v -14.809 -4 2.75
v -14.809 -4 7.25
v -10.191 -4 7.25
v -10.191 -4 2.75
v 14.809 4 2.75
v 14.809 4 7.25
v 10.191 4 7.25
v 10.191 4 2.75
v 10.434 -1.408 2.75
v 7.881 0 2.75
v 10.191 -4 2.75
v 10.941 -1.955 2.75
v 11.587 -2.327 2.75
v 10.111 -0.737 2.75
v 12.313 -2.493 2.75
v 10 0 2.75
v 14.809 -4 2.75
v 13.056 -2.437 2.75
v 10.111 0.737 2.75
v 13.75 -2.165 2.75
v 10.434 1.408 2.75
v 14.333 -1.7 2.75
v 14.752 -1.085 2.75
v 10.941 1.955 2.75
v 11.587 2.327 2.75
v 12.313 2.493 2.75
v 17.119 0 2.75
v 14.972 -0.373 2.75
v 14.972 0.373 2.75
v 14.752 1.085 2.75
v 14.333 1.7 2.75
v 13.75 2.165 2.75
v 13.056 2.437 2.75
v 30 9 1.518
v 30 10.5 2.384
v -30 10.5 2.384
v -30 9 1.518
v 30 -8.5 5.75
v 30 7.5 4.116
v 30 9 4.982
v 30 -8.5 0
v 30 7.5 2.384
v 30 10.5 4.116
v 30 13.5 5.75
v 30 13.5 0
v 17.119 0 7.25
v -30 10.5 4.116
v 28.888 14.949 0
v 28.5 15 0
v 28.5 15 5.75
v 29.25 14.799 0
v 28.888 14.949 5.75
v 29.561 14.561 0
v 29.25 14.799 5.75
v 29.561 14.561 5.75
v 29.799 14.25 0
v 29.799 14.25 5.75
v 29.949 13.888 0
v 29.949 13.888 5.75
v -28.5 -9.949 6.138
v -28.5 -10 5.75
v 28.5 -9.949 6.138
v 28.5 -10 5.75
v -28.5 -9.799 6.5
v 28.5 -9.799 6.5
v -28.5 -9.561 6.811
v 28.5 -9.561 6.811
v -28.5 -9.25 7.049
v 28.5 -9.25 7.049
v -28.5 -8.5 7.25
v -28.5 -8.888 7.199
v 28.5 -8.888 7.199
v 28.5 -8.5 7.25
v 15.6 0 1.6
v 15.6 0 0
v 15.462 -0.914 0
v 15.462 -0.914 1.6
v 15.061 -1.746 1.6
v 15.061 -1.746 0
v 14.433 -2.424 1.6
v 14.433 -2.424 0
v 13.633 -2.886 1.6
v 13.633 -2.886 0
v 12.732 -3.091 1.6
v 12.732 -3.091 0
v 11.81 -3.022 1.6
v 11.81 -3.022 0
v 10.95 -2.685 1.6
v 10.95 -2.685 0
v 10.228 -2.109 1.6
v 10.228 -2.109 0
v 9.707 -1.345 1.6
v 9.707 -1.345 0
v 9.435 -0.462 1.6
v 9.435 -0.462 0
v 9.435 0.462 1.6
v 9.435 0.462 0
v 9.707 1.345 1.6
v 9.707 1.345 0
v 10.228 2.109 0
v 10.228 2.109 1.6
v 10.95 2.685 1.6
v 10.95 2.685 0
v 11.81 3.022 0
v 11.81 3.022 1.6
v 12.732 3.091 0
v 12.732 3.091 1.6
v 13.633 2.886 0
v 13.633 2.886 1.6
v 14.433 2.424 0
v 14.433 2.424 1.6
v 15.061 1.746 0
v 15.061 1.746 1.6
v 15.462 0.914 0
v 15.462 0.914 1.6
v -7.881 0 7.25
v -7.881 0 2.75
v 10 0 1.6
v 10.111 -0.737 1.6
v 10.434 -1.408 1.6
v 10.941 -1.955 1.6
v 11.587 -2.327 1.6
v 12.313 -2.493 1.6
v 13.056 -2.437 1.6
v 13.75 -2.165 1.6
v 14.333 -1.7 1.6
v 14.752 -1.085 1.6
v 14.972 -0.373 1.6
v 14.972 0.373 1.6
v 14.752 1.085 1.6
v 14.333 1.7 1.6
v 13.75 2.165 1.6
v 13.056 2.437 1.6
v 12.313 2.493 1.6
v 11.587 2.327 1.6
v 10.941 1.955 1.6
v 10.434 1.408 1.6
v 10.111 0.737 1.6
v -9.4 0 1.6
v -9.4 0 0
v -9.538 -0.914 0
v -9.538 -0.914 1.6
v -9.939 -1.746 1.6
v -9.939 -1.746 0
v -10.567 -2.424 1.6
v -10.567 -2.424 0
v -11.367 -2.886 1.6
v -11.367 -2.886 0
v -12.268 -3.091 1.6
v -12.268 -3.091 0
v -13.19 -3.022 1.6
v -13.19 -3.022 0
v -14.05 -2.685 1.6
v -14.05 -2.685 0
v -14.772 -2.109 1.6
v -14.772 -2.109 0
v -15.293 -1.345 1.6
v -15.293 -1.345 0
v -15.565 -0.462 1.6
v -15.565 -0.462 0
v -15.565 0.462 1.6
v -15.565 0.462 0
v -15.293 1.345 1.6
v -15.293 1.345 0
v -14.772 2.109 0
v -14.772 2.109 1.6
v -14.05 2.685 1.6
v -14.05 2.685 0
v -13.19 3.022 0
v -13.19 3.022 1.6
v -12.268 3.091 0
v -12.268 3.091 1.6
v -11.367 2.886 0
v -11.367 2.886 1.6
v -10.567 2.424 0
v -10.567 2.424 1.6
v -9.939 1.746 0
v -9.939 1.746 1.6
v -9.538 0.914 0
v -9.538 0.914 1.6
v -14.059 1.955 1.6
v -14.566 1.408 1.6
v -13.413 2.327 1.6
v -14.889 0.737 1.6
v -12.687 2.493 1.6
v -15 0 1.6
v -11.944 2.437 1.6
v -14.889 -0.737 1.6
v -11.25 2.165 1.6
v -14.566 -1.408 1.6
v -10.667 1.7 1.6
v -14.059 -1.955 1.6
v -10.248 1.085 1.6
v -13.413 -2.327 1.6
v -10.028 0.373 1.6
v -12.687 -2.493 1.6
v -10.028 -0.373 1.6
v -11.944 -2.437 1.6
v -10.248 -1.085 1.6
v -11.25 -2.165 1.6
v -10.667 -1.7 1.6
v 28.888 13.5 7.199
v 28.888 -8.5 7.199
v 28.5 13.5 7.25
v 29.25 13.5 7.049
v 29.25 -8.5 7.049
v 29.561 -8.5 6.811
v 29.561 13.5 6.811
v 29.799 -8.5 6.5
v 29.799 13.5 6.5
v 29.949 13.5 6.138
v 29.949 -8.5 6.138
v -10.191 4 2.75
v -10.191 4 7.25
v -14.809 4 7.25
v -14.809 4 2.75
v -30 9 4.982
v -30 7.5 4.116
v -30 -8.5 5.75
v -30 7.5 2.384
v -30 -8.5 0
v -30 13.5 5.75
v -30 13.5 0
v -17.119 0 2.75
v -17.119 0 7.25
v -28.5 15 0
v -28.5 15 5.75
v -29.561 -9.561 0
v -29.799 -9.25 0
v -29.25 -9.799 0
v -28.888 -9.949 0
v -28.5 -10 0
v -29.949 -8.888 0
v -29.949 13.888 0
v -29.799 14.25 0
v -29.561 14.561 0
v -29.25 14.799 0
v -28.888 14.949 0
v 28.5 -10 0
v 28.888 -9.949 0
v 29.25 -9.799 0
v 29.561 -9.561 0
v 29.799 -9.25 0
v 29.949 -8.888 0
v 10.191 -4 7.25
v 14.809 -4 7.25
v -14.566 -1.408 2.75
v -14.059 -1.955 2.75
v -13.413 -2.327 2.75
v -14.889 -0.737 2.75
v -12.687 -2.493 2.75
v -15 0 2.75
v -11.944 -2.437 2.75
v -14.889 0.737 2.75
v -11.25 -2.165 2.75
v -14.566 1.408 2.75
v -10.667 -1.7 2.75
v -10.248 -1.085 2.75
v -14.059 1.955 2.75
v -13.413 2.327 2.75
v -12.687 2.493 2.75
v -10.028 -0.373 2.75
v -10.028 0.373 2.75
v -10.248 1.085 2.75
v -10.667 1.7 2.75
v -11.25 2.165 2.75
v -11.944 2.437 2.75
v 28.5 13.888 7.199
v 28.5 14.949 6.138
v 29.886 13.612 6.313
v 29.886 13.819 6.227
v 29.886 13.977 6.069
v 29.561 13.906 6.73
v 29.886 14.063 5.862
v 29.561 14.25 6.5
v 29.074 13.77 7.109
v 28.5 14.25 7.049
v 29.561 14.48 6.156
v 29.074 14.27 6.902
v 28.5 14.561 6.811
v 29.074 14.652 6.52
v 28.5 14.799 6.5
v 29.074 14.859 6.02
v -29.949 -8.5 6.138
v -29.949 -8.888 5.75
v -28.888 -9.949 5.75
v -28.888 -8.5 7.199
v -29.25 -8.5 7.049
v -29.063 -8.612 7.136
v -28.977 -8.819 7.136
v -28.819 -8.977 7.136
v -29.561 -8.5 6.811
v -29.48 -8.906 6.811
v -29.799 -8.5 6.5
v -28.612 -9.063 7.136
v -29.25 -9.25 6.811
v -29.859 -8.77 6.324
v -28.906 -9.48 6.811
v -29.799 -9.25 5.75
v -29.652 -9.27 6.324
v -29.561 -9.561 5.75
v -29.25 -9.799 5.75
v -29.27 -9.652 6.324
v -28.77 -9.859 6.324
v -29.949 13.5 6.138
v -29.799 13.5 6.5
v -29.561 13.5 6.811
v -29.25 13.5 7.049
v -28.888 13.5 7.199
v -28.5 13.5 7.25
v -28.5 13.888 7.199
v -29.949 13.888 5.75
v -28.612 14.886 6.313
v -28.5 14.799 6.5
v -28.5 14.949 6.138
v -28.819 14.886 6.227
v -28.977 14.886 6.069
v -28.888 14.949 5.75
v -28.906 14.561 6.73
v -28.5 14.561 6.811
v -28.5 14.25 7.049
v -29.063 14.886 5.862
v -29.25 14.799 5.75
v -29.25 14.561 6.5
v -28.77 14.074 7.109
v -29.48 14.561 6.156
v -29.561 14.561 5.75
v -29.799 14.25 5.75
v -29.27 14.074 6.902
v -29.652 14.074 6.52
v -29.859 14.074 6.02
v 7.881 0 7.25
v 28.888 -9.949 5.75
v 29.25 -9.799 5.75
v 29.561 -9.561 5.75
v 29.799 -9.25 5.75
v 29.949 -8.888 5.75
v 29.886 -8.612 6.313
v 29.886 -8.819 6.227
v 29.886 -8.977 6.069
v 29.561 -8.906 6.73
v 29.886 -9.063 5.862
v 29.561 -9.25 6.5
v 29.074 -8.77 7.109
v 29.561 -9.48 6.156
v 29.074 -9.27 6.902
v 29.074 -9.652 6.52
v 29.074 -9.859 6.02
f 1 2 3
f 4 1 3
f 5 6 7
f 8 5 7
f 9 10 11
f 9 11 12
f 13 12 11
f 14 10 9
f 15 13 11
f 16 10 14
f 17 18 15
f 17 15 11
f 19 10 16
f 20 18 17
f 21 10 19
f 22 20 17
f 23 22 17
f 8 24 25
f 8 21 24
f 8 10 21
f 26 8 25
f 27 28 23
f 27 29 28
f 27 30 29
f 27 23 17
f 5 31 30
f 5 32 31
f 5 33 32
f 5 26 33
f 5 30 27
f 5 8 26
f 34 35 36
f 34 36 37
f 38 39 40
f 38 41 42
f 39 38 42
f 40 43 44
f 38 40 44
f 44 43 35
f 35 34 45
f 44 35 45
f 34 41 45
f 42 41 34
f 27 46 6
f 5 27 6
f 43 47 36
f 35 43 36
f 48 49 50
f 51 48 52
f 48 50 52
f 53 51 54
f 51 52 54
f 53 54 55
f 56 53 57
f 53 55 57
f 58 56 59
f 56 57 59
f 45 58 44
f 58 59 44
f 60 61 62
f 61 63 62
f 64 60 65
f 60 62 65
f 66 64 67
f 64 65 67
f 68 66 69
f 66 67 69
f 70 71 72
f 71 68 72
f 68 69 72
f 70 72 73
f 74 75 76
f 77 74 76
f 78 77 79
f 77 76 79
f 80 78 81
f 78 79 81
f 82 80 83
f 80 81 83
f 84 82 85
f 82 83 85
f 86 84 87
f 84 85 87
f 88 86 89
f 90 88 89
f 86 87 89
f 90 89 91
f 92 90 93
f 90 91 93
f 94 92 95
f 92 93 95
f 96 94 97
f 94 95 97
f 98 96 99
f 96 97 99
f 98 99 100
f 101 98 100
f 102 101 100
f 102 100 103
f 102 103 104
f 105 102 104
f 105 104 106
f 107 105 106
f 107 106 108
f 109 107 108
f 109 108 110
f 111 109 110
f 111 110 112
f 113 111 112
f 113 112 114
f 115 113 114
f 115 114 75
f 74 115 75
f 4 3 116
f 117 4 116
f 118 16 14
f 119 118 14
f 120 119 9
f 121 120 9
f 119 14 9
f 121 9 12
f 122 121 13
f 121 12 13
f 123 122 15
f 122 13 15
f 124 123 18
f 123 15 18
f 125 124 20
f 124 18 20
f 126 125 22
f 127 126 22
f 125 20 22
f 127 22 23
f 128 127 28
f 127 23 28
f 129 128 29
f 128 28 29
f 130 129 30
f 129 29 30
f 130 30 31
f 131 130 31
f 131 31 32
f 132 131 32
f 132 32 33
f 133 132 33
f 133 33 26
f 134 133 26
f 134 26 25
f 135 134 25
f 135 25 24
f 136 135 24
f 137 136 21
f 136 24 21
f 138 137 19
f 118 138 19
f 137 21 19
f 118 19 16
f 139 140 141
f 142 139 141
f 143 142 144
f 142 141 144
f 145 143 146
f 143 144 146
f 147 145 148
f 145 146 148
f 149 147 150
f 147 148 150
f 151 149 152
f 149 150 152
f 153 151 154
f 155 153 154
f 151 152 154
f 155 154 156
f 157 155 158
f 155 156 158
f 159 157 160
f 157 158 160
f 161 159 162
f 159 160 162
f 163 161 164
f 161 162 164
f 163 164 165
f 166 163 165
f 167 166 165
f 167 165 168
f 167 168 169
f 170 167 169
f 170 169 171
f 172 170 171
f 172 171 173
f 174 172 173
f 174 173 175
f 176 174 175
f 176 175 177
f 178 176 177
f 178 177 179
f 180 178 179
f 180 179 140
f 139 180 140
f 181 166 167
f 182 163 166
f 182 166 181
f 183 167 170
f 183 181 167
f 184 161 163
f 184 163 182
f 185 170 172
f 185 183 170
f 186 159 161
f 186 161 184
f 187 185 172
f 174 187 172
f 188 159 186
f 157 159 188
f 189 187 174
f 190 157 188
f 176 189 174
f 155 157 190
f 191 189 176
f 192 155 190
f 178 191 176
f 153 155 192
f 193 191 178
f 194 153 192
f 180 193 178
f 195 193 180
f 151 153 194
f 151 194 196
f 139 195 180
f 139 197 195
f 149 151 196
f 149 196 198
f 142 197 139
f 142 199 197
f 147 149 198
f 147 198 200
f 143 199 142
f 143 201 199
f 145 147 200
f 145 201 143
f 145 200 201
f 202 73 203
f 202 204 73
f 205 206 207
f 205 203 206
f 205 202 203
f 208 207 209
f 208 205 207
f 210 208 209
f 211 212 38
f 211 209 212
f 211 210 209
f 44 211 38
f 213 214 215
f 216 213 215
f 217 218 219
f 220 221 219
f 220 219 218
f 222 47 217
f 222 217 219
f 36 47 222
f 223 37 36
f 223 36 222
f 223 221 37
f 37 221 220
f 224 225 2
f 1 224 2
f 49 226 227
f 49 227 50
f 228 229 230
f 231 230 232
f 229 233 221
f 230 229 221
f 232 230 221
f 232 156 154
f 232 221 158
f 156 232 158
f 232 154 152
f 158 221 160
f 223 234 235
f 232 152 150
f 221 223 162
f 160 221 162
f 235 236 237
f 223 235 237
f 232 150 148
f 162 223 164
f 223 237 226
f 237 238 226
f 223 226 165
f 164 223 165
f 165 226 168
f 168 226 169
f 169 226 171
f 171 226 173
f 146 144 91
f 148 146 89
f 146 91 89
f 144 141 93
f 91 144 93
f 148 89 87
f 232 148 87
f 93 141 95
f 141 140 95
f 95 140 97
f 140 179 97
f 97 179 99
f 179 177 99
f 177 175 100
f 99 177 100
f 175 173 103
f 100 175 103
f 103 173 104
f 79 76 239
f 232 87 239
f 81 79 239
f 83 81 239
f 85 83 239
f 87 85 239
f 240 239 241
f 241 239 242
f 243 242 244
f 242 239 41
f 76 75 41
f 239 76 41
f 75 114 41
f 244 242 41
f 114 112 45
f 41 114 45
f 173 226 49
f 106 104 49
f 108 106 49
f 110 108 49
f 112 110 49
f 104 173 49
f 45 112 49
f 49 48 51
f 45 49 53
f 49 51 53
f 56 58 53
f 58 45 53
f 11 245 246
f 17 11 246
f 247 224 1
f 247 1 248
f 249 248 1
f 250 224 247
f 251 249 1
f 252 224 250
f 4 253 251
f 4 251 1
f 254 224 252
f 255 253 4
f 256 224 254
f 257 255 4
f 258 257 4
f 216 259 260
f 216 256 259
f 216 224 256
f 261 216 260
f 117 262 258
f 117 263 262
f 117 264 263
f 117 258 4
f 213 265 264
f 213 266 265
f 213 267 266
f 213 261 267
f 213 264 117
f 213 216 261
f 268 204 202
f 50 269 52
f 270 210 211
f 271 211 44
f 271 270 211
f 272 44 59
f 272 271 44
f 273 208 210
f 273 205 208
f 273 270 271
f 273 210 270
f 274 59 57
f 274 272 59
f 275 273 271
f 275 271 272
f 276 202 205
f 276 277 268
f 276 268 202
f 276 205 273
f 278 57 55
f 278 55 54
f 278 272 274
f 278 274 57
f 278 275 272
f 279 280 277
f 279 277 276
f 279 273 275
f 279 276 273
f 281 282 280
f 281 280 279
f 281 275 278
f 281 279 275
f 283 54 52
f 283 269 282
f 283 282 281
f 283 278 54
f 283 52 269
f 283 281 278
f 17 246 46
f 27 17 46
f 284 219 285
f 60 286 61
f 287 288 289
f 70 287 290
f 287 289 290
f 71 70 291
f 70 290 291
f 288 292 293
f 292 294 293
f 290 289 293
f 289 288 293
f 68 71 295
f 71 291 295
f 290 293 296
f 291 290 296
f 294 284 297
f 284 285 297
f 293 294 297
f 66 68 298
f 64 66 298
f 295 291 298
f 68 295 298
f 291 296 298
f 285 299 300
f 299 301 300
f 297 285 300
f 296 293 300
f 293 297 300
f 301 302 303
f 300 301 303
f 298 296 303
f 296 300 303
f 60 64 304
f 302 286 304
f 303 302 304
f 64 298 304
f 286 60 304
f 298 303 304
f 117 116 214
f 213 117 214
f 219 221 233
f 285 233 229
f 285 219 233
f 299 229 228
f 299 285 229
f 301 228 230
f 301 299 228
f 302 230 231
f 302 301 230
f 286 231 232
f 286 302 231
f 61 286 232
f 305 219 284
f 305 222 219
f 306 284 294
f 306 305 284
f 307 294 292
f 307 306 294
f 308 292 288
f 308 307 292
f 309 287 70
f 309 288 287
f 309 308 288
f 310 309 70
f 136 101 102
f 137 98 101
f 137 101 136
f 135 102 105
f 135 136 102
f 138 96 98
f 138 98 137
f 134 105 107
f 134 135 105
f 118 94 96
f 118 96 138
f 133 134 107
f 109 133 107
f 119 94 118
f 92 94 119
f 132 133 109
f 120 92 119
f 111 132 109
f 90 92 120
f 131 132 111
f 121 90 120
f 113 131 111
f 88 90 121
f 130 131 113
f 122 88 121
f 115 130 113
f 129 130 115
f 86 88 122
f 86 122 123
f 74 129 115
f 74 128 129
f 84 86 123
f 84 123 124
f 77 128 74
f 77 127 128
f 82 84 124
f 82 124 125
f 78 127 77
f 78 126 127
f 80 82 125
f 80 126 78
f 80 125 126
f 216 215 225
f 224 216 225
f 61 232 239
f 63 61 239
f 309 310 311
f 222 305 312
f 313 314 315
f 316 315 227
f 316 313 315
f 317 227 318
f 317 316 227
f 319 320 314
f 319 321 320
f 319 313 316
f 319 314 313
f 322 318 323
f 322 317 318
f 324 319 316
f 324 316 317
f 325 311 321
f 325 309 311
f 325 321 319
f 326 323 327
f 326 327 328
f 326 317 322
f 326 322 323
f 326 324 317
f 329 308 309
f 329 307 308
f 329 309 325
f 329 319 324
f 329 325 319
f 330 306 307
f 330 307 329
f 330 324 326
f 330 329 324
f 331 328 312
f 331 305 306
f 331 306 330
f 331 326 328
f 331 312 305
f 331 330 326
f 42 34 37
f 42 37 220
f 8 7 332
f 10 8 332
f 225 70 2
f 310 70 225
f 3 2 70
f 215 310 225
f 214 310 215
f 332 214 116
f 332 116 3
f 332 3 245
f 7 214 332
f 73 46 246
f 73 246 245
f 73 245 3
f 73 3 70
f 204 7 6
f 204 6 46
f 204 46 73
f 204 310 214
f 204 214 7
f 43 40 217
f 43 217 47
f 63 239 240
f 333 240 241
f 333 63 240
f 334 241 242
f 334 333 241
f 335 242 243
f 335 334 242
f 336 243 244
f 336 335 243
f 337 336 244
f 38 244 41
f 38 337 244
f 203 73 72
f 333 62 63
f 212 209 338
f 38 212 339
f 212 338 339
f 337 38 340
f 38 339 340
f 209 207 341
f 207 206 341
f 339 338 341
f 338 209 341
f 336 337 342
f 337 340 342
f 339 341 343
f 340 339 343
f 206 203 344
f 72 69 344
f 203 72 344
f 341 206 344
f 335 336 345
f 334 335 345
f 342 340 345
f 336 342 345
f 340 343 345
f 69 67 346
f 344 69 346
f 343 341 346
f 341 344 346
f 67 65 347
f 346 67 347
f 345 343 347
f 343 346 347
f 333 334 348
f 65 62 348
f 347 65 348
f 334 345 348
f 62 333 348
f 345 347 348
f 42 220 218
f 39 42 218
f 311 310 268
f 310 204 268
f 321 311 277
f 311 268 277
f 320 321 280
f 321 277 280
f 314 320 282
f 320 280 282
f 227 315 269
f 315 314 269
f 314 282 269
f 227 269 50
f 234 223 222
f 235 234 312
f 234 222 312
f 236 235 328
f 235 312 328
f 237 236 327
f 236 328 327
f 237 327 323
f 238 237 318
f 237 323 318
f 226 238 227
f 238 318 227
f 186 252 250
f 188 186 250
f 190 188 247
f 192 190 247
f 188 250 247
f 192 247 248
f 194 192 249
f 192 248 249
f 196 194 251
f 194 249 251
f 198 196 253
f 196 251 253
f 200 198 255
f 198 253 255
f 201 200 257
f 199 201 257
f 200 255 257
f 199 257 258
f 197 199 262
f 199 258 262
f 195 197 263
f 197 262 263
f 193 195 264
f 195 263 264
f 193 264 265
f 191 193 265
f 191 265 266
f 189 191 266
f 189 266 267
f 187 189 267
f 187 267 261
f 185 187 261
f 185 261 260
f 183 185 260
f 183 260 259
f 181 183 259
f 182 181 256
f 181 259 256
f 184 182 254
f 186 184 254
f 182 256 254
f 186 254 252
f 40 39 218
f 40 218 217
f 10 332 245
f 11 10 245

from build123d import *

# Parameters (mm, degrees)
SKETCH_W         = 60
SKETCH_H         = 25
PAD_DEPTH        = 7.25
HOLE_D           = 5
HOLE_DEPTH       = 25
HOLE_CBORE_D     = 6.2
HOLE_CBORE_DEPTH = 1.6
POCKET_DEPTH     = 4.5
POCKET001_DEPTH  = 60.001
FILLET_R         = 1.5


with BuildPart() as part:
    # Sketch → Pad (new body)
    with BuildSketch(Plane.XY):
        with Locations((0, 2.5)):
            Rectangle(SKETCH_W, SKETCH_H)
    extrude(amount=PAD_DEPTH)

    # Hole
    with Locations(Plane(origin=(0, 0, 0), x_dir=(1, 0, 0), z_dir=(0, 0, -1))):
        with Locations((-12.5, 0), (12.5, 0)):
            CounterBoreHole(HOLE_D / 2, HOLE_CBORE_D / 2, HOLE_CBORE_DEPTH, depth=HOLE_DEPTH)

    # Sketch002 (on Face5 of Hole) → Pocket (cut)
    with BuildSketch(Plane.XY.offset(7.25)):
        Polygon((-10.190599, 4), (-14.809401, 4), (-17.118802, 0), (-14.809401, -4), (-10.190599, -4), (-7.881198, 0), align=None)
        Polygon((10.190599, 4), (7.881198, 0), (10.190599, -4), (14.809401, -4), (17.118802, 0), (14.809401, 4), align=None)
    extrude(amount=-POCKET_DEPTH, mode=Mode.SUBTRACT)

    # Sketch003 (on Face2 of Pocket) → Pocket001 (cut, through all)
    with BuildSketch(Plane(origin=(-30, 0, 0), x_dir=(0, -1, 0), z_dir=(-1, 0, 0))):
        Polygon((-7.5, 4.116025), (-9, 4.982051), (-10.5, 4.116025), (-10.5, 2.383975), (-9, 1.517949), (-7.5, 2.383975), align=None)
    extrude(amount=-POCKET001_DEPTH, mode=Mode.SUBTRACT)

    # Fillet
    fillet_edges = [part.edges().sort_by_distance(p)[0] for p in [
        (-30, -10, 3.625),
        (-30, 2.5, 7.25),
        (0, 15, 7.25),
        (0, -10, 7.25),
        (-30, 15, 3.625),
        (30, 2.5, 7.25),
        (30, -10, 3.625),
        (30, 15, 3.625),
    ]]
    fillet(fillet_edges, radius=FILLET_R)


solid = part.part
